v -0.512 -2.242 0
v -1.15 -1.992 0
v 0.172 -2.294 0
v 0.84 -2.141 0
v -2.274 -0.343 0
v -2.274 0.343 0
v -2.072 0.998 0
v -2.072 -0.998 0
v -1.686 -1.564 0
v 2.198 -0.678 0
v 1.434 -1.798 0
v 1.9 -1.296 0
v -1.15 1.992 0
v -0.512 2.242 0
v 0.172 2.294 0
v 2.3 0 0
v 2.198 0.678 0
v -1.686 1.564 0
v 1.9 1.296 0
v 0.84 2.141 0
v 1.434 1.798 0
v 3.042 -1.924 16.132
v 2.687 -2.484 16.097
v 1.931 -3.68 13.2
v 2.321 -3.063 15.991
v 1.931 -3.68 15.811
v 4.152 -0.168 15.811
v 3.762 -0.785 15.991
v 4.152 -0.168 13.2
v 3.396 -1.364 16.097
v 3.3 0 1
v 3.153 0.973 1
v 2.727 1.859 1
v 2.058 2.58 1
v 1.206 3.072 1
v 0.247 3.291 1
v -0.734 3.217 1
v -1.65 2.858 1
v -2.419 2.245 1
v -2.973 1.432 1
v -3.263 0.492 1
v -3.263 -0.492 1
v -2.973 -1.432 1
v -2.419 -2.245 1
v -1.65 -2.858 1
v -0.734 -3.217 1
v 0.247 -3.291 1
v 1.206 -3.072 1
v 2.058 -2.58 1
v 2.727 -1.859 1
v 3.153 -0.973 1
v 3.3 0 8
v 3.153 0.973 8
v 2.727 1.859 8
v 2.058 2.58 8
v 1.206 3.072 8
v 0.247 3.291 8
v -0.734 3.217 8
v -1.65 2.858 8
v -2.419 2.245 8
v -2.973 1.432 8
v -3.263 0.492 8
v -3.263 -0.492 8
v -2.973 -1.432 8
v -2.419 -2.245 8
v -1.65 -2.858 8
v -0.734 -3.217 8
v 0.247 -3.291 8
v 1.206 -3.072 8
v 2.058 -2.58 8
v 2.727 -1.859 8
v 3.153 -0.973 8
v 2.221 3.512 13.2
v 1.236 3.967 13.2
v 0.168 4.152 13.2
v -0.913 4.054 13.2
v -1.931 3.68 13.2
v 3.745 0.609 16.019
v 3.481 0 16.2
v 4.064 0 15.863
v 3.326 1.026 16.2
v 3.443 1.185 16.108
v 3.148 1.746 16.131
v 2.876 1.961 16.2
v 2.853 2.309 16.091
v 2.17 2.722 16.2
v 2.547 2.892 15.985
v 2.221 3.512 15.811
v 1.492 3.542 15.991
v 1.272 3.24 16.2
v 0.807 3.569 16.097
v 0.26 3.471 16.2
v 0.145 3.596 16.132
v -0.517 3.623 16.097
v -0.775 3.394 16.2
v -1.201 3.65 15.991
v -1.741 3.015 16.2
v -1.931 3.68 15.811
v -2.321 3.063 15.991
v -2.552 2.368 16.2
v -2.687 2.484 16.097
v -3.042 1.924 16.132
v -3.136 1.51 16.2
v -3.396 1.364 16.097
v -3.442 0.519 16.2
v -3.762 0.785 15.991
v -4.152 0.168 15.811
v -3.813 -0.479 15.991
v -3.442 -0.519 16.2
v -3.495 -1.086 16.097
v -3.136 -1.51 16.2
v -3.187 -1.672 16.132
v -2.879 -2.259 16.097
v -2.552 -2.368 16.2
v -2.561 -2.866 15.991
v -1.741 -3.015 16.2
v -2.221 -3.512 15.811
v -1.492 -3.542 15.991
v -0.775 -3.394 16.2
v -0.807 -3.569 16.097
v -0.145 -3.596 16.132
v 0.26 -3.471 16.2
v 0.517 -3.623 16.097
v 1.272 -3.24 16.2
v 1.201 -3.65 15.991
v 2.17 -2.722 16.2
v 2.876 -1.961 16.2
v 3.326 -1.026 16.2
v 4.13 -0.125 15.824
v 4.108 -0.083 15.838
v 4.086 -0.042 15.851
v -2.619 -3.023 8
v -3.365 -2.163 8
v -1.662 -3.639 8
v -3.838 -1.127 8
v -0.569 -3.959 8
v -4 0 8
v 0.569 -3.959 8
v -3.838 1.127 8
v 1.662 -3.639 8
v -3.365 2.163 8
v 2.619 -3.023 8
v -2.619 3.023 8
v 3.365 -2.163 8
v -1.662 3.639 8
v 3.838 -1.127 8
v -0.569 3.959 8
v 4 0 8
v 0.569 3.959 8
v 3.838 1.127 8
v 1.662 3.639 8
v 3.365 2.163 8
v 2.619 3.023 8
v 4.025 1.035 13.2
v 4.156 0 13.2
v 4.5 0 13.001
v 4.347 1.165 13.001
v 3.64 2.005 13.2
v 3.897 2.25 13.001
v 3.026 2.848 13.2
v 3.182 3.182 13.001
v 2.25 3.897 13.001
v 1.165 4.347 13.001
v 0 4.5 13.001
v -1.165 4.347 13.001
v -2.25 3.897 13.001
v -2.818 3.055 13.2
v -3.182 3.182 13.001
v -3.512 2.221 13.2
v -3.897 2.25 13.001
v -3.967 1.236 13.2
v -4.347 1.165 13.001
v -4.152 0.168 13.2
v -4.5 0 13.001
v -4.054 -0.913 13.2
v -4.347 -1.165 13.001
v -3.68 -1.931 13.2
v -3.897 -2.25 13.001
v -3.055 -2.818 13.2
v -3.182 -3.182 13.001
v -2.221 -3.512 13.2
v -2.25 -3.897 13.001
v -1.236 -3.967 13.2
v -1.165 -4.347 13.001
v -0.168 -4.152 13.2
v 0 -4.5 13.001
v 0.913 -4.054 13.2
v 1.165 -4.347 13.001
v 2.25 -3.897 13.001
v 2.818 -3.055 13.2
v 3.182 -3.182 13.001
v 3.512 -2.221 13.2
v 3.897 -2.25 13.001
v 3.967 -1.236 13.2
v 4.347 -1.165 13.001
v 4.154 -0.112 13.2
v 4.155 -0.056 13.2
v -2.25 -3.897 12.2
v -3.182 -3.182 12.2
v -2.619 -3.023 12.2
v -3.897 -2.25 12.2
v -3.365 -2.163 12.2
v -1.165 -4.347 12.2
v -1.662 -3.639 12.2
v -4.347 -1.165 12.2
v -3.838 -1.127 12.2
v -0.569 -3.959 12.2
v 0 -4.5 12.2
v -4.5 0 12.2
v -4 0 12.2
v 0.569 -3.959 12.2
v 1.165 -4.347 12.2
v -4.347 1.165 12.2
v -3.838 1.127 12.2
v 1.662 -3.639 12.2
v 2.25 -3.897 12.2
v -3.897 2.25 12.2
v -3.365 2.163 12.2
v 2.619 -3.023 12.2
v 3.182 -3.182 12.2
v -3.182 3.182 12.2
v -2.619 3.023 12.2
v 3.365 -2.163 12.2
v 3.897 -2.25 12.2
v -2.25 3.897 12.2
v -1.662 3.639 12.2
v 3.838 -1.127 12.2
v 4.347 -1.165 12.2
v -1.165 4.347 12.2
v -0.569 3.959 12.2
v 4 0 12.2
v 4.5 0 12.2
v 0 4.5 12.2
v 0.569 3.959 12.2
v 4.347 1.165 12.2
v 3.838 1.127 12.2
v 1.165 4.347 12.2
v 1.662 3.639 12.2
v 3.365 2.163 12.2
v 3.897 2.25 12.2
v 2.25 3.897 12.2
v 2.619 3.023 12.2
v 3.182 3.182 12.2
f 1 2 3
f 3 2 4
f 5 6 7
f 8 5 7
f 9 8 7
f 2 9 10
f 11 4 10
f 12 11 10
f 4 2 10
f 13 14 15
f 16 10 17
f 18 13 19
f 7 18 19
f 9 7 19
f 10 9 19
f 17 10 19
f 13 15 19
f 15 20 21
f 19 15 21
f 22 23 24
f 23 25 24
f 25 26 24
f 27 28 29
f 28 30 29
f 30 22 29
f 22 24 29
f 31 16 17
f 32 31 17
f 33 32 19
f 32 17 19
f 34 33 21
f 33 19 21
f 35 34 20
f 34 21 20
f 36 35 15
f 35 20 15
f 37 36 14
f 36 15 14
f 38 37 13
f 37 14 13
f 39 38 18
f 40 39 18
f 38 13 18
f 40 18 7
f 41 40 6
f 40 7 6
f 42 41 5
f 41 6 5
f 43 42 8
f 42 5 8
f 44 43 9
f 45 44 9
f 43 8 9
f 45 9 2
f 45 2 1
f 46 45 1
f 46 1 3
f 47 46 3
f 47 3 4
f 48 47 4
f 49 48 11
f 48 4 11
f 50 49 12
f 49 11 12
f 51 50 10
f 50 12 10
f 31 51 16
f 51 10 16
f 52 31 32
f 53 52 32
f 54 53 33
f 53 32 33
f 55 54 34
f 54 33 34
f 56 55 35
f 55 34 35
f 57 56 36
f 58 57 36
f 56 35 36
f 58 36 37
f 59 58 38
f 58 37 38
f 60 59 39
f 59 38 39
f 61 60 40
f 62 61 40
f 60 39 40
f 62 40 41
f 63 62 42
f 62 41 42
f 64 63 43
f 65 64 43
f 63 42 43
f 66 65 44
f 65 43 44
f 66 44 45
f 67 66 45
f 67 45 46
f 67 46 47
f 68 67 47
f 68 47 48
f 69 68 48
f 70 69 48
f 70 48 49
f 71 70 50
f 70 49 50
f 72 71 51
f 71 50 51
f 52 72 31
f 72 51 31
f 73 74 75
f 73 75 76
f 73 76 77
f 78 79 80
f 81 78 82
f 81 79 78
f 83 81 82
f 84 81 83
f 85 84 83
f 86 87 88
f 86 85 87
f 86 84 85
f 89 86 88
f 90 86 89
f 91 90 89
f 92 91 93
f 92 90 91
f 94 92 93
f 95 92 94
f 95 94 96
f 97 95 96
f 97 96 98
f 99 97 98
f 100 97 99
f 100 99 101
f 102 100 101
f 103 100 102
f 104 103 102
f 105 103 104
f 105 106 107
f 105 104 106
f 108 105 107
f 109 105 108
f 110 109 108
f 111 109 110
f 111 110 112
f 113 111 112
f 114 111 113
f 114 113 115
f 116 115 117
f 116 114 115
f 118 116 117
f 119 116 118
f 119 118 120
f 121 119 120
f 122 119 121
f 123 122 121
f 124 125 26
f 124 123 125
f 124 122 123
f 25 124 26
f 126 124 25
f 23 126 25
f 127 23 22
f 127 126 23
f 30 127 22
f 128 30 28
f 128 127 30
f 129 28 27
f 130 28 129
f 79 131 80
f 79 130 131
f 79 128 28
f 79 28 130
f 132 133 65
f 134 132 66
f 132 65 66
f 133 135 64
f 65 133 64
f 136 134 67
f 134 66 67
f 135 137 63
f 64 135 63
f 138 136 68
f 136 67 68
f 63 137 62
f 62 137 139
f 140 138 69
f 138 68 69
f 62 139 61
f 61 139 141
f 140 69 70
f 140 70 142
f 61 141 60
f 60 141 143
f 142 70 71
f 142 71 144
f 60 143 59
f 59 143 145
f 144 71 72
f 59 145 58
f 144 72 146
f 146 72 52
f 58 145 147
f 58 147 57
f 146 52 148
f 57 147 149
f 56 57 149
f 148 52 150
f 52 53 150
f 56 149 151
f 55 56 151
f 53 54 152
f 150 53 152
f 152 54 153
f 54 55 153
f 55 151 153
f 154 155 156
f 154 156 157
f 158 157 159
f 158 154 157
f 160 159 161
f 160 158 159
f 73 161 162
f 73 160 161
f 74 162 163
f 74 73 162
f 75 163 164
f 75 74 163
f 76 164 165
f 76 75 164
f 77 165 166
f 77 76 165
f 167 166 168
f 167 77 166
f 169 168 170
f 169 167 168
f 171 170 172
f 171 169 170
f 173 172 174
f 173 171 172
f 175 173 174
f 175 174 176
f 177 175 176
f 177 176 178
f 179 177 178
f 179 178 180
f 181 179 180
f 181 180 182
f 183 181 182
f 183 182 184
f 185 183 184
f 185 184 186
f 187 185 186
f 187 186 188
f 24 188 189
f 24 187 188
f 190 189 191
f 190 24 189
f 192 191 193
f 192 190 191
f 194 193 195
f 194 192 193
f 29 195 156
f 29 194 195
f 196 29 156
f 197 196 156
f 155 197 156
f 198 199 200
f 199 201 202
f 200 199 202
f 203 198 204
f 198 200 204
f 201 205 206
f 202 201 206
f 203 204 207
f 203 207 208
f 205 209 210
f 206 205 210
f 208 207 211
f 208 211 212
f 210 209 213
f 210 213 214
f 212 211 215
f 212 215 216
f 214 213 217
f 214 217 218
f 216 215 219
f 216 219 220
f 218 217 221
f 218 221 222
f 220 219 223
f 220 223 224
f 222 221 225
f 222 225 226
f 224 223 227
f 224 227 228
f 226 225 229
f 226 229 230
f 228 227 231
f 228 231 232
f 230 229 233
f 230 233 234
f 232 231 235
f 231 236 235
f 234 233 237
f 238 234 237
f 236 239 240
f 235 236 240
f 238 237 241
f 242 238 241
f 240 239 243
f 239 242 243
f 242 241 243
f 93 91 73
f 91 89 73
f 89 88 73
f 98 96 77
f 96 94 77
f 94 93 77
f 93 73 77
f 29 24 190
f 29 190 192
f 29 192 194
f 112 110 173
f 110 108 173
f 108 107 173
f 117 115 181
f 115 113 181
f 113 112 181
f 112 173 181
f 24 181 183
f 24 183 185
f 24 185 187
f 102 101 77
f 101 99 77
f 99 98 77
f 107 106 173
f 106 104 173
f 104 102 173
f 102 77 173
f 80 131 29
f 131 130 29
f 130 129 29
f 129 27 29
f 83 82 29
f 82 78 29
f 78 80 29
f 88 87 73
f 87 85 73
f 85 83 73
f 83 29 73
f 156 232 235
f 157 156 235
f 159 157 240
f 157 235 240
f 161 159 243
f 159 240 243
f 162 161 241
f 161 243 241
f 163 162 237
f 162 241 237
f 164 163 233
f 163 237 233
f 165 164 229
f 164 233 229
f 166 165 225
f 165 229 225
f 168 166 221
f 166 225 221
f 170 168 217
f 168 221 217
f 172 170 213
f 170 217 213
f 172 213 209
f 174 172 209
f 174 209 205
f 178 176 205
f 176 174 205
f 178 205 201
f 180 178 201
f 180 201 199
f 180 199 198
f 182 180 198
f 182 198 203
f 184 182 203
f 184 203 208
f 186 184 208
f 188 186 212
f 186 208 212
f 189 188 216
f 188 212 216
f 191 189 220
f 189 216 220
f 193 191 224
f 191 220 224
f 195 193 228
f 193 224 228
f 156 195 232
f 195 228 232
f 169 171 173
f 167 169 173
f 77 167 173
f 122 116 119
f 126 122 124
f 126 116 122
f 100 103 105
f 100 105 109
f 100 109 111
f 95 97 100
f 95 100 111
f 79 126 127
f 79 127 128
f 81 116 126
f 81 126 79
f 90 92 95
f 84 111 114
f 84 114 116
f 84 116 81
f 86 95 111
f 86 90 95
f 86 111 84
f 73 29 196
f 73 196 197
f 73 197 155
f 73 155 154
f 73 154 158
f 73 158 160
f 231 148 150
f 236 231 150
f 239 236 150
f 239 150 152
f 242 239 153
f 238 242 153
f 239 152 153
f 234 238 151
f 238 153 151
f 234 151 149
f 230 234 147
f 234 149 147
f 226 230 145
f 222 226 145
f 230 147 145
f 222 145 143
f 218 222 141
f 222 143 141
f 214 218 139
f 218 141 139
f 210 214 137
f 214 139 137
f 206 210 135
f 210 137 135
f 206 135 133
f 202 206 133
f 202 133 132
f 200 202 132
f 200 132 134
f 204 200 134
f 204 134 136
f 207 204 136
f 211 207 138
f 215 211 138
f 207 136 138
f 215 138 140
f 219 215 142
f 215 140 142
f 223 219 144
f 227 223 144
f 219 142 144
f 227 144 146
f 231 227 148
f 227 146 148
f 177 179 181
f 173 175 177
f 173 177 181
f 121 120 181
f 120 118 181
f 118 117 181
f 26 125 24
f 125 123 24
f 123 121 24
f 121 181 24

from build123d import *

# Parameters (mm, degrees)
SKETCH_1_R          = 3.3
EXTRUDE_1_DEPTH     = 8
SKETCH_2_R          = 4
EXTRUDE_2_DEPTH     = 4.2
SKETCH_3_R          = 4.5
EXTRUDE_3_DEPTH     = 1
SKETCH_4_OUTSIDE_W  = 18.132
SKETCH_4_OUTSIDE_H  = 18.132
SKETCH_4_OUTSIDE_R  = 4.155576512
CUT_EXTRUDE_1_DEPTH = 1
CUT_EXTRUDE_1_DRAFT = -60
EXTRUDE_4_DEPTH     = 3
SKETCH_6_OUTSIDE_W  = 25.512
SKETCH_6_OUTSIDE_H  = 25.512
SKETCH_6_OUTSIDE_R  = 3.481100129
CUT_EXTRUDE_2_DEPTH = 3
CUT_EXTRUDE_2_DRAFT = -60
CHAMFER_1_SIZE      = 1


with BuildPart() as part:
    # Sketch 1 → Extrude 1 (new body)
    with BuildSketch(Plane.XY):
        Circle(SKETCH_1_R)
    extrude(amount=EXTRUDE_1_DEPTH)

    # Sketch 2 → Extrude 2 (add)
    with BuildSketch(Plane.XY.offset(8)):
        Circle(SKETCH_2_R)
    extrude(amount=EXTRUDE_2_DEPTH)

    # Sketch 3 → Extrude 3 (add)
    with BuildSketch(Plane.XY.offset(12.2)):
        Circle(SKETCH_3_R)
    extrude(amount=EXTRUDE_3_DEPTH)


with BuildPart() as cut_extrude_1_tool:
    # Sketch 4 outside → Cut-Extrude 1 (with draft: the straight prism first)
    with BuildSketch(Plane.XY.offset(13.2)):
        Rectangle(SKETCH_4_OUTSIDE_W, SKETCH_4_OUTSIDE_H)
        Circle(SKETCH_4_OUTSIDE_R, mode=Mode.SUBTRACT)
    extrude(amount=-CUT_EXTRUDE_1_DEPTH)
    # Cut-Extrude 1: the draft: its side faces are tilted about the plane it starts from
    cut_extrude_1_sides = [cut_extrude_1_tool.faces().sort_by_distance(p)[0] for p in [
        (0, -9.066, 12.7),
        (9.066, 0, 12.7),
        (0, 9.066, 12.7),
        (-9.066, 0, 12.7),
        (-4.155576512, 0, 12.7),
    ]]
    draft(cut_extrude_1_sides, Plane.XY.offset(13.2), CUT_EXTRUDE_1_DRAFT)


with BuildPart() as part_1:
    add(part.part)

    # Cut-Extrude 1: cut by cut_extrude_1_tool
    add(cut_extrude_1_tool.part, mode=Mode.SUBTRACT)

    # Sketch 5 → Extrude 4 (add)
    with BuildSketch(Plane.XY.offset(13.2)):
        Polygon((-4.152198442, 0.167523856), (-2.221179136, -3.512147404), (1.931019306, -3.679671261), (4.152198442, -0.167523856), (2.221179136, 3.512147404), (-1.931019306, 3.679671261), align=None)
    extrude(amount=EXTRUDE_4_DEPTH)


with BuildPart() as cut_extrude_2_tool:
    # Sketch 6 outside → Cut-Extrude 2 (with draft: the straight prism first)
    with BuildSketch(Plane.XY.offset(16.2)):
        Rectangle(SKETCH_6_OUTSIDE_W, SKETCH_6_OUTSIDE_H)
        Circle(SKETCH_6_OUTSIDE_R, mode=Mode.SUBTRACT)
    extrude(amount=-CUT_EXTRUDE_2_DEPTH)
    # Cut-Extrude 2: the draft: its side faces are tilted about the plane it starts from
    cut_extrude_2_sides = [cut_extrude_2_tool.faces().sort_by_distance(p)[0] for p in [
        (0, -12.756, 14.7),
        (12.756, 0, 14.7),
        (0, 12.756, 14.7),
        (-12.756, 0, 14.7),
        (-3.481100129, 0, 14.7),
    ]]
    draft(cut_extrude_2_sides, Plane.XY.offset(16.2), CUT_EXTRUDE_2_DRAFT)


with BuildPart() as part_2:
    add(part_1.part)

    # Cut-Extrude 2: cut by cut_extrude_2_tool
    add(cut_extrude_2_tool.part, mode=Mode.SUBTRACT)

    # Chamfer 1
    chamfer_1_edges = [part_2.edges().sort_by_distance(p)[0] for p in [
        (-3.3, 0, 0),
    ]]
    chamfer(chamfer_1_edges, length=CHAMFER_1_SIZE)


solid = part_2.part
